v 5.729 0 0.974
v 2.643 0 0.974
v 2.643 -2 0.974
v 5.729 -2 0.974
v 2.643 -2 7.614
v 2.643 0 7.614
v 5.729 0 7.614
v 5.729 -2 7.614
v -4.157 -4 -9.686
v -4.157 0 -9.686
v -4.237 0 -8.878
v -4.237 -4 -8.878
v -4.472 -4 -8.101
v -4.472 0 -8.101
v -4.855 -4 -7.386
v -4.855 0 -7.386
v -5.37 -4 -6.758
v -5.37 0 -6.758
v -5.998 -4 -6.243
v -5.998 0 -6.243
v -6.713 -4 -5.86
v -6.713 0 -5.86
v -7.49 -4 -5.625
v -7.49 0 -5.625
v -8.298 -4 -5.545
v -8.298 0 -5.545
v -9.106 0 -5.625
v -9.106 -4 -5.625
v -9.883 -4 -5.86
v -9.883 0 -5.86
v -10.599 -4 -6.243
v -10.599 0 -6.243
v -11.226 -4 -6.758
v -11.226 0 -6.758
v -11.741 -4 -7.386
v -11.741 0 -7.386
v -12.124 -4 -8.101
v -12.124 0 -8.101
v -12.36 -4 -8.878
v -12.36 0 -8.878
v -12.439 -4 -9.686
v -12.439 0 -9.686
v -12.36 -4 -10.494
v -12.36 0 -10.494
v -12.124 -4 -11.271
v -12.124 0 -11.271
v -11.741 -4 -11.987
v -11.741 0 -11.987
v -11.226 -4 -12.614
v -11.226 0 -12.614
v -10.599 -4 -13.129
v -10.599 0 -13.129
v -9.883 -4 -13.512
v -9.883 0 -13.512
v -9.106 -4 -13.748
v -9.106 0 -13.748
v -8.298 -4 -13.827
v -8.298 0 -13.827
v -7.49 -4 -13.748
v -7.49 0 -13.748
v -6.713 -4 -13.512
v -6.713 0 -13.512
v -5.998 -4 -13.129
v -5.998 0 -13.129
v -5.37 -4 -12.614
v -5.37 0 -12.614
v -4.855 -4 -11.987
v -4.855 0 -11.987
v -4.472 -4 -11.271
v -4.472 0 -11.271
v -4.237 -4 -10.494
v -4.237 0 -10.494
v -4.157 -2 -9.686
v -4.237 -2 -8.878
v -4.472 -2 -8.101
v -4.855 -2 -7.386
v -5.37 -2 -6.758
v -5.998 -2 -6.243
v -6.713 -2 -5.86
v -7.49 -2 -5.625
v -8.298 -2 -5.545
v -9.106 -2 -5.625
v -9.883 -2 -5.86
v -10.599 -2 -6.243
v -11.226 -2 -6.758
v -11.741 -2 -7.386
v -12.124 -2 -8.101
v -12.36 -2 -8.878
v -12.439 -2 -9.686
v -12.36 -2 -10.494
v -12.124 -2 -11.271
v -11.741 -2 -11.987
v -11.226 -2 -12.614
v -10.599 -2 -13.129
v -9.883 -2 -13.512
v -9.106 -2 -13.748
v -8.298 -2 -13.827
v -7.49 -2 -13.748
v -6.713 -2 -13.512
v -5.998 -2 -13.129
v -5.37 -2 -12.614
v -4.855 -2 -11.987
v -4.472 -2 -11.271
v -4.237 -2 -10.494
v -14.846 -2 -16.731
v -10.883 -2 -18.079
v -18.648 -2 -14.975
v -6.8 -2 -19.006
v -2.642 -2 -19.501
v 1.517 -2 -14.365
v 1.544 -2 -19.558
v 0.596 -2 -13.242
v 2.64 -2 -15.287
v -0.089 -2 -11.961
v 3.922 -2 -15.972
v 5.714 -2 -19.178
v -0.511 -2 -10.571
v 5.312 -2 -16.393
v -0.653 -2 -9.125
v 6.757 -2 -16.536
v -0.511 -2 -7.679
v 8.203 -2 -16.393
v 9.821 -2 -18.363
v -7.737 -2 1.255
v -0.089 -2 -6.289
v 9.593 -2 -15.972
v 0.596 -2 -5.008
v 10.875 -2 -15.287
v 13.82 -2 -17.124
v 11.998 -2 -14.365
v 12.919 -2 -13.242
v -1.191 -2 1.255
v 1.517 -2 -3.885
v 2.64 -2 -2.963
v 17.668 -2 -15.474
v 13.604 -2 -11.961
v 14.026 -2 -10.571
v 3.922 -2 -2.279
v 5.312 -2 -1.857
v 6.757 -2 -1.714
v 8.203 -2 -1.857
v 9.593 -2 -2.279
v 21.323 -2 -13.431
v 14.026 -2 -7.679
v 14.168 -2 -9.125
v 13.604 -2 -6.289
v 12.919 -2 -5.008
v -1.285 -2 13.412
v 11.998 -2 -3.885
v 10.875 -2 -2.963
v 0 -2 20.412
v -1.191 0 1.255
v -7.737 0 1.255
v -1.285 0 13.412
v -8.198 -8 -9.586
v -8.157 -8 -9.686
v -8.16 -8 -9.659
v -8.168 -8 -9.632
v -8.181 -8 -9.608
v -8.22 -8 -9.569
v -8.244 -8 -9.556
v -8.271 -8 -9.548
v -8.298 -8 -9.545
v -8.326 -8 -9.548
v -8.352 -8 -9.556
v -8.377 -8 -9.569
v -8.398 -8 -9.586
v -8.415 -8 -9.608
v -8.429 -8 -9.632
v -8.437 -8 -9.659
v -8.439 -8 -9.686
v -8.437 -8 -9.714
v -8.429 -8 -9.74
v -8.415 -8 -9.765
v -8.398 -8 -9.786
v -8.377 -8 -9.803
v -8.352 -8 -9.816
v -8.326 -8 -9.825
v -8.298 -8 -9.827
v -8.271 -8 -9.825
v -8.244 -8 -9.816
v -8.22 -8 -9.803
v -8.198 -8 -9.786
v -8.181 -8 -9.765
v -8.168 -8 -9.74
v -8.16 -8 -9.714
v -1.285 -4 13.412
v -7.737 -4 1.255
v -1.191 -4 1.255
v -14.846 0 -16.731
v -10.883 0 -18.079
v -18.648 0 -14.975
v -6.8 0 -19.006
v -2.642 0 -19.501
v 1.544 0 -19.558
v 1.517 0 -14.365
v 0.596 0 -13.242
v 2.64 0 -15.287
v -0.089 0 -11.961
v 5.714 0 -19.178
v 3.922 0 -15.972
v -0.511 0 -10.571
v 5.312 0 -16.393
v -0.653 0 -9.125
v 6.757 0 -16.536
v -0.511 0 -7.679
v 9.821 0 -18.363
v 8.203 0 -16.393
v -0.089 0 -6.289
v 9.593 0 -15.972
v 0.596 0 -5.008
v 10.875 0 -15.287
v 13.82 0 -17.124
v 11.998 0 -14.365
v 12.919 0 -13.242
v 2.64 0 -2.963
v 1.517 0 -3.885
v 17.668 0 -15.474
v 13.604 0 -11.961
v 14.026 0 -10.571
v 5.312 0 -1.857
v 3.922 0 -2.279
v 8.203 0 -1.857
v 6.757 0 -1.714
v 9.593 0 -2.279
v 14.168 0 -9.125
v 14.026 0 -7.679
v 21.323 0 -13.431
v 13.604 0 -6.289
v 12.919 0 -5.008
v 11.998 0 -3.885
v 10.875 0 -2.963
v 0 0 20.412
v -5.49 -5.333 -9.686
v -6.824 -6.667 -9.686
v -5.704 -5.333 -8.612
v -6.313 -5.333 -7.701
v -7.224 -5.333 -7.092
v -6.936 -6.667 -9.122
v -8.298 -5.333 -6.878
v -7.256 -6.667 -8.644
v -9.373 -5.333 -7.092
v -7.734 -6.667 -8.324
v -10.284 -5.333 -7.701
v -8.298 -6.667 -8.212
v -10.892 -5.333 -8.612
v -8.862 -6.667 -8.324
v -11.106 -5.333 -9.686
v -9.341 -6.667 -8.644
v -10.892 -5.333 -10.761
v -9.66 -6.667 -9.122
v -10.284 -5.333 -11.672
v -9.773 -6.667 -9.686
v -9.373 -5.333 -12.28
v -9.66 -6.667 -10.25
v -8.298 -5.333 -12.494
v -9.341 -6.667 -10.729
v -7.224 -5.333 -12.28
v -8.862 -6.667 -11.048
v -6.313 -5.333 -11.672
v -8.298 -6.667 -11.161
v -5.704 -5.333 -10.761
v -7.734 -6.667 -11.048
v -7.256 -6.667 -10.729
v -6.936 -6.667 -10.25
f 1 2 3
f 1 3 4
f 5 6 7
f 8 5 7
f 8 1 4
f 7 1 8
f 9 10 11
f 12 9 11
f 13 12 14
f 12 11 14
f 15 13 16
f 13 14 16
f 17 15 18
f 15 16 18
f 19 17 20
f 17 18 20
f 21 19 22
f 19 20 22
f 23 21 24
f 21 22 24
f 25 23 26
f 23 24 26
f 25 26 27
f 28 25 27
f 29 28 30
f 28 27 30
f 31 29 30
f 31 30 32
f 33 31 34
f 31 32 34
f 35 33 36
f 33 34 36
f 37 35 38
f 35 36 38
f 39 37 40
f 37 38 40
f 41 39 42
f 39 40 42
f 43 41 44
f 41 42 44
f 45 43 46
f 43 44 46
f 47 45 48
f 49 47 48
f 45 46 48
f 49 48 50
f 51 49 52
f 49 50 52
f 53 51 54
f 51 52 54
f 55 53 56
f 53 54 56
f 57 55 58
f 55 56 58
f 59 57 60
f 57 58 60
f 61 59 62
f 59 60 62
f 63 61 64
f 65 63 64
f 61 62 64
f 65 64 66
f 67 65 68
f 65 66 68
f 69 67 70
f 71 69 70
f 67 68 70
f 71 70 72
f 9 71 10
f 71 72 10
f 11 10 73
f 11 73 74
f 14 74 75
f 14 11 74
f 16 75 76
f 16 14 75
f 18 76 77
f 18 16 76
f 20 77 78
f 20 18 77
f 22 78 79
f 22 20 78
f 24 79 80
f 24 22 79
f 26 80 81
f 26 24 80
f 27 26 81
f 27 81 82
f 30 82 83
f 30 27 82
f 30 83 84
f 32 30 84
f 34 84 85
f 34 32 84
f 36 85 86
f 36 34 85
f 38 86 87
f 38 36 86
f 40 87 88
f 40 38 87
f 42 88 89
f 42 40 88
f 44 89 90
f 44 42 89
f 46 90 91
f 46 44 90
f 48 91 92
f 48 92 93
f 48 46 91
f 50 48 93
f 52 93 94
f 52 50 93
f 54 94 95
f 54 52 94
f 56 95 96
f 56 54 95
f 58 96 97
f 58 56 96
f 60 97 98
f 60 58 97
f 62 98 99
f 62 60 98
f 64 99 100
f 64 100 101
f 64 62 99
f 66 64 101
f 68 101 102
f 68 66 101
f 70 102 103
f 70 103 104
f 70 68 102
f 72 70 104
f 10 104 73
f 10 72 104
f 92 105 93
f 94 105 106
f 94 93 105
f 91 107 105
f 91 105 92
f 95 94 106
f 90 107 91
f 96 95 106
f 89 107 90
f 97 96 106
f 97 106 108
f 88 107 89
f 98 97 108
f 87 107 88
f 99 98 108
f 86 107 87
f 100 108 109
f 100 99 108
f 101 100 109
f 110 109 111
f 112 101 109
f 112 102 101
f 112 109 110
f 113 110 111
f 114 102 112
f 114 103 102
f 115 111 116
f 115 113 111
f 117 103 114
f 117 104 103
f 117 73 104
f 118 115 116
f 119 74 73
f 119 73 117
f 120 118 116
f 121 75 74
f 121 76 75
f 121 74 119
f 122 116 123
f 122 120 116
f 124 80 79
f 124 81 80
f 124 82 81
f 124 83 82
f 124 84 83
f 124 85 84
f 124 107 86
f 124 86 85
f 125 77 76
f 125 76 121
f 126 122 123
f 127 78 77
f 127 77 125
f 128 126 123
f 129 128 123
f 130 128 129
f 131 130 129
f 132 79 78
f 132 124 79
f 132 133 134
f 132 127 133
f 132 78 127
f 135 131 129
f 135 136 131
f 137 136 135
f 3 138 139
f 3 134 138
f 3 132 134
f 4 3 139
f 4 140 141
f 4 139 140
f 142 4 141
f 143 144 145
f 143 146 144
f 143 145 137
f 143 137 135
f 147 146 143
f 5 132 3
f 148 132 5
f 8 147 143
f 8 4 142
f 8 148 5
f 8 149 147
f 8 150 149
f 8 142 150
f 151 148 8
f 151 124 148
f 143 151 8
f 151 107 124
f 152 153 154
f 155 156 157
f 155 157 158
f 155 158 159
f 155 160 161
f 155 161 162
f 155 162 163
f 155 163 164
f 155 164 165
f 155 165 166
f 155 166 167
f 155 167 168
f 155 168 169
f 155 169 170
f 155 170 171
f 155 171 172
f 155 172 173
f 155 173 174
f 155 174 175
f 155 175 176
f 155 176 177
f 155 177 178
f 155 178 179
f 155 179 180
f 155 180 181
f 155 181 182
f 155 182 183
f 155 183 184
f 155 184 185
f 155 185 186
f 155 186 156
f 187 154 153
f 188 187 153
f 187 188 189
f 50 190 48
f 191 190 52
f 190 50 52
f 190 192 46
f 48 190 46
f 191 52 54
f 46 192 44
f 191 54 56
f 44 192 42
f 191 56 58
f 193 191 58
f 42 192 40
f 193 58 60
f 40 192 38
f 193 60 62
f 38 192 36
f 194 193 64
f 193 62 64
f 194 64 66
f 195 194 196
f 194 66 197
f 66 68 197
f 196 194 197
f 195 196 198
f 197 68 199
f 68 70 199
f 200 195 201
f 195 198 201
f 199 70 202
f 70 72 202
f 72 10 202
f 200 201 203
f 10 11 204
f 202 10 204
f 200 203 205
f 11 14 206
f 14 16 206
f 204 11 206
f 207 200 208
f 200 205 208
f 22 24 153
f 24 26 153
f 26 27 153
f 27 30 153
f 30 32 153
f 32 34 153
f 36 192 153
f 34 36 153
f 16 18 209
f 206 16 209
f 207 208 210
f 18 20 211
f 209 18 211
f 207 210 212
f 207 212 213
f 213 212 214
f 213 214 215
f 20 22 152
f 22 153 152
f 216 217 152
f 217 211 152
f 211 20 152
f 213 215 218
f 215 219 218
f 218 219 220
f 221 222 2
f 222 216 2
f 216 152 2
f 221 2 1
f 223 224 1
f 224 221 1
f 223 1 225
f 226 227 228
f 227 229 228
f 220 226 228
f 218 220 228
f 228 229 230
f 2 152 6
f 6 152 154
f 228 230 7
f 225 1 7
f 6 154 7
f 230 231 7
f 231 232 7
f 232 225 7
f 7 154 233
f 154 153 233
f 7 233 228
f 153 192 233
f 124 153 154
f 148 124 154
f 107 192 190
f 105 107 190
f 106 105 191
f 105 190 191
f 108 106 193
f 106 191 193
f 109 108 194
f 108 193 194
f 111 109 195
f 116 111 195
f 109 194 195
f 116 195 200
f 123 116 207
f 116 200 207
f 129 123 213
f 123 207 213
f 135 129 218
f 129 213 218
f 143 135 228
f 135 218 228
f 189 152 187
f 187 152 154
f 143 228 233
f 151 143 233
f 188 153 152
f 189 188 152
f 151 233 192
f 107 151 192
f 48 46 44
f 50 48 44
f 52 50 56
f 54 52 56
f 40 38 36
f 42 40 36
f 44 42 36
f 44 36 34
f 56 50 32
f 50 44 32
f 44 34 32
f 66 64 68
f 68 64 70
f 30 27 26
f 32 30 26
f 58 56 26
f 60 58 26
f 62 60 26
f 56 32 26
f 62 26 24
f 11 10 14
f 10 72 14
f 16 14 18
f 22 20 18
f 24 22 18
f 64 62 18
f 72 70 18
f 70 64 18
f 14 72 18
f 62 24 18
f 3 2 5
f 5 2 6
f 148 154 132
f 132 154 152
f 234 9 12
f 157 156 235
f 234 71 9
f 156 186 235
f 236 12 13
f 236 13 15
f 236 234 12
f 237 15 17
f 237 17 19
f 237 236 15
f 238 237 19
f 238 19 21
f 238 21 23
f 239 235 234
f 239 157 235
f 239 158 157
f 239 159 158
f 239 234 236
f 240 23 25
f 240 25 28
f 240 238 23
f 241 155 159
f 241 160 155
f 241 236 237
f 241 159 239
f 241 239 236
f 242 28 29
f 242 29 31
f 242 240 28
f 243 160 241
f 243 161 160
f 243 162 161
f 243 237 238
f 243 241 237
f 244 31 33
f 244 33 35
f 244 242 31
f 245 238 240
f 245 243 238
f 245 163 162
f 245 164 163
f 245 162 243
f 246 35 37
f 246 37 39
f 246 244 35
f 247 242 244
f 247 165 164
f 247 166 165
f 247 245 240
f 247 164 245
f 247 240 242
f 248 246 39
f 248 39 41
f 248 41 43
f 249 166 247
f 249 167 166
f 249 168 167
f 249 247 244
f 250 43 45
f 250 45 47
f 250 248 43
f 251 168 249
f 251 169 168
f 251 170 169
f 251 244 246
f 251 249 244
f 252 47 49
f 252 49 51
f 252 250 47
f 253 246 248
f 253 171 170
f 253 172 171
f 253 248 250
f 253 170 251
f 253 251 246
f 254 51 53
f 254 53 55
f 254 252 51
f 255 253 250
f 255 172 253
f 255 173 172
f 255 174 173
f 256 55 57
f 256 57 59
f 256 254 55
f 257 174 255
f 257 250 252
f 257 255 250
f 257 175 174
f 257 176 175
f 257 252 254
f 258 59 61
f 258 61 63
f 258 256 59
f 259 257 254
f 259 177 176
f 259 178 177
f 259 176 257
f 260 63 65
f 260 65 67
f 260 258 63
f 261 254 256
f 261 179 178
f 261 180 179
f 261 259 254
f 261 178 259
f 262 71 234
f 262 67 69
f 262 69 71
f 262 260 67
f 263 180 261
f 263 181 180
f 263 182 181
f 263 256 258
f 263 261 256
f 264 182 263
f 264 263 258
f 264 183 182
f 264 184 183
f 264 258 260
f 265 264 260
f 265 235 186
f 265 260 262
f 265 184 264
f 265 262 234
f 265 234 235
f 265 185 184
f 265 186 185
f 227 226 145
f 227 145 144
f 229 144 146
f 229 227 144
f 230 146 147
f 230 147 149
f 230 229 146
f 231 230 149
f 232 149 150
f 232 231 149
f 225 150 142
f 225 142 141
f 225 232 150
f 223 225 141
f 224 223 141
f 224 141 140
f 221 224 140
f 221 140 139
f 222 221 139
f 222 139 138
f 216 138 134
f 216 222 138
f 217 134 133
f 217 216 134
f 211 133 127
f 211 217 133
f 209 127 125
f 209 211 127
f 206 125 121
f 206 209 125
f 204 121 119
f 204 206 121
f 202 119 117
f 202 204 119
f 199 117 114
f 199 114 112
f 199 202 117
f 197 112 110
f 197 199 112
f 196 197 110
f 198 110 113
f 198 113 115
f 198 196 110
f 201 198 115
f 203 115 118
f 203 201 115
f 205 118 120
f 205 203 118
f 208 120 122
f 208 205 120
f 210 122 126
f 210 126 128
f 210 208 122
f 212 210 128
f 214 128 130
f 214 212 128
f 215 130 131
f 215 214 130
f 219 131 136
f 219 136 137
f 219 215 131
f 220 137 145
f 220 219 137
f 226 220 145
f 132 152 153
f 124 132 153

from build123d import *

# Parameters (mm, degrees)
F0_R     = 4.14107
F0_R_2   = 7.410606
F0_W     = 3.085942
F0_H     = 6.639451
F1_DEPTH = 2
F2_DEPTH = 4
F3_DEPTH = 8
F4_SIZE  = 4


with BuildPart() as f1:
    # F0 (on Front) → F1 (new body)
    with BuildSketch(Plane.XZ):
        with BuildLine():
            Line((21.322626, -13.430809), (0, 20.412146))
            Line((0, 20.412146), (-18.647546, -14.975267))
            ThreePointArc((-18.647546, -14.975267), (1.544458, -19.558026), (21.322626, -13.430809))
        make_face()
        with Locations((-8.298183, -9.686158)):
            Circle(F0_R, mode=Mode.SUBTRACT)
        with Locations((6.757477, -9.125078)):
            Circle(F0_R_2, mode=Mode.SUBTRACT)
        Polygon((-7.737102, 1.254911), (-1.284677, 13.411654), (-1.191163, 1.254911), align=None, mode=Mode.SUBTRACT)
        with Locations((4.185858, 4.294097)):
            Rectangle(F0_W, F0_H, mode=Mode.SUBTRACT)
    extrude(amount=F1_DEPTH)


with BuildPart() as f2:
    # F0 (on Front) → F2 (new body)
    with BuildSketch(Plane.XZ):
        Polygon((-1.191163, 1.254911), (-1.284677, 13.411654), (-7.737102, 1.254911), align=None)
    extrude(amount=F2_DEPTH)


with BuildPart() as f3:
    # F0 (on Front) → F3 (new body)
    with BuildSketch(Plane.XZ):
        with Locations((-8.298183, -9.686158)):
            Circle(F0_R)
    extrude(amount=F3_DEPTH)

    # F4
    f4_edges = [f3.edges().sort_by_distance(p)[0] for p in [
        (-12.439253, -8, -9.686158),
    ]]
    chamfer(f4_edges, length=F4_SIZE)


solid = Compound([f1.part, f2.part, f3.part])
